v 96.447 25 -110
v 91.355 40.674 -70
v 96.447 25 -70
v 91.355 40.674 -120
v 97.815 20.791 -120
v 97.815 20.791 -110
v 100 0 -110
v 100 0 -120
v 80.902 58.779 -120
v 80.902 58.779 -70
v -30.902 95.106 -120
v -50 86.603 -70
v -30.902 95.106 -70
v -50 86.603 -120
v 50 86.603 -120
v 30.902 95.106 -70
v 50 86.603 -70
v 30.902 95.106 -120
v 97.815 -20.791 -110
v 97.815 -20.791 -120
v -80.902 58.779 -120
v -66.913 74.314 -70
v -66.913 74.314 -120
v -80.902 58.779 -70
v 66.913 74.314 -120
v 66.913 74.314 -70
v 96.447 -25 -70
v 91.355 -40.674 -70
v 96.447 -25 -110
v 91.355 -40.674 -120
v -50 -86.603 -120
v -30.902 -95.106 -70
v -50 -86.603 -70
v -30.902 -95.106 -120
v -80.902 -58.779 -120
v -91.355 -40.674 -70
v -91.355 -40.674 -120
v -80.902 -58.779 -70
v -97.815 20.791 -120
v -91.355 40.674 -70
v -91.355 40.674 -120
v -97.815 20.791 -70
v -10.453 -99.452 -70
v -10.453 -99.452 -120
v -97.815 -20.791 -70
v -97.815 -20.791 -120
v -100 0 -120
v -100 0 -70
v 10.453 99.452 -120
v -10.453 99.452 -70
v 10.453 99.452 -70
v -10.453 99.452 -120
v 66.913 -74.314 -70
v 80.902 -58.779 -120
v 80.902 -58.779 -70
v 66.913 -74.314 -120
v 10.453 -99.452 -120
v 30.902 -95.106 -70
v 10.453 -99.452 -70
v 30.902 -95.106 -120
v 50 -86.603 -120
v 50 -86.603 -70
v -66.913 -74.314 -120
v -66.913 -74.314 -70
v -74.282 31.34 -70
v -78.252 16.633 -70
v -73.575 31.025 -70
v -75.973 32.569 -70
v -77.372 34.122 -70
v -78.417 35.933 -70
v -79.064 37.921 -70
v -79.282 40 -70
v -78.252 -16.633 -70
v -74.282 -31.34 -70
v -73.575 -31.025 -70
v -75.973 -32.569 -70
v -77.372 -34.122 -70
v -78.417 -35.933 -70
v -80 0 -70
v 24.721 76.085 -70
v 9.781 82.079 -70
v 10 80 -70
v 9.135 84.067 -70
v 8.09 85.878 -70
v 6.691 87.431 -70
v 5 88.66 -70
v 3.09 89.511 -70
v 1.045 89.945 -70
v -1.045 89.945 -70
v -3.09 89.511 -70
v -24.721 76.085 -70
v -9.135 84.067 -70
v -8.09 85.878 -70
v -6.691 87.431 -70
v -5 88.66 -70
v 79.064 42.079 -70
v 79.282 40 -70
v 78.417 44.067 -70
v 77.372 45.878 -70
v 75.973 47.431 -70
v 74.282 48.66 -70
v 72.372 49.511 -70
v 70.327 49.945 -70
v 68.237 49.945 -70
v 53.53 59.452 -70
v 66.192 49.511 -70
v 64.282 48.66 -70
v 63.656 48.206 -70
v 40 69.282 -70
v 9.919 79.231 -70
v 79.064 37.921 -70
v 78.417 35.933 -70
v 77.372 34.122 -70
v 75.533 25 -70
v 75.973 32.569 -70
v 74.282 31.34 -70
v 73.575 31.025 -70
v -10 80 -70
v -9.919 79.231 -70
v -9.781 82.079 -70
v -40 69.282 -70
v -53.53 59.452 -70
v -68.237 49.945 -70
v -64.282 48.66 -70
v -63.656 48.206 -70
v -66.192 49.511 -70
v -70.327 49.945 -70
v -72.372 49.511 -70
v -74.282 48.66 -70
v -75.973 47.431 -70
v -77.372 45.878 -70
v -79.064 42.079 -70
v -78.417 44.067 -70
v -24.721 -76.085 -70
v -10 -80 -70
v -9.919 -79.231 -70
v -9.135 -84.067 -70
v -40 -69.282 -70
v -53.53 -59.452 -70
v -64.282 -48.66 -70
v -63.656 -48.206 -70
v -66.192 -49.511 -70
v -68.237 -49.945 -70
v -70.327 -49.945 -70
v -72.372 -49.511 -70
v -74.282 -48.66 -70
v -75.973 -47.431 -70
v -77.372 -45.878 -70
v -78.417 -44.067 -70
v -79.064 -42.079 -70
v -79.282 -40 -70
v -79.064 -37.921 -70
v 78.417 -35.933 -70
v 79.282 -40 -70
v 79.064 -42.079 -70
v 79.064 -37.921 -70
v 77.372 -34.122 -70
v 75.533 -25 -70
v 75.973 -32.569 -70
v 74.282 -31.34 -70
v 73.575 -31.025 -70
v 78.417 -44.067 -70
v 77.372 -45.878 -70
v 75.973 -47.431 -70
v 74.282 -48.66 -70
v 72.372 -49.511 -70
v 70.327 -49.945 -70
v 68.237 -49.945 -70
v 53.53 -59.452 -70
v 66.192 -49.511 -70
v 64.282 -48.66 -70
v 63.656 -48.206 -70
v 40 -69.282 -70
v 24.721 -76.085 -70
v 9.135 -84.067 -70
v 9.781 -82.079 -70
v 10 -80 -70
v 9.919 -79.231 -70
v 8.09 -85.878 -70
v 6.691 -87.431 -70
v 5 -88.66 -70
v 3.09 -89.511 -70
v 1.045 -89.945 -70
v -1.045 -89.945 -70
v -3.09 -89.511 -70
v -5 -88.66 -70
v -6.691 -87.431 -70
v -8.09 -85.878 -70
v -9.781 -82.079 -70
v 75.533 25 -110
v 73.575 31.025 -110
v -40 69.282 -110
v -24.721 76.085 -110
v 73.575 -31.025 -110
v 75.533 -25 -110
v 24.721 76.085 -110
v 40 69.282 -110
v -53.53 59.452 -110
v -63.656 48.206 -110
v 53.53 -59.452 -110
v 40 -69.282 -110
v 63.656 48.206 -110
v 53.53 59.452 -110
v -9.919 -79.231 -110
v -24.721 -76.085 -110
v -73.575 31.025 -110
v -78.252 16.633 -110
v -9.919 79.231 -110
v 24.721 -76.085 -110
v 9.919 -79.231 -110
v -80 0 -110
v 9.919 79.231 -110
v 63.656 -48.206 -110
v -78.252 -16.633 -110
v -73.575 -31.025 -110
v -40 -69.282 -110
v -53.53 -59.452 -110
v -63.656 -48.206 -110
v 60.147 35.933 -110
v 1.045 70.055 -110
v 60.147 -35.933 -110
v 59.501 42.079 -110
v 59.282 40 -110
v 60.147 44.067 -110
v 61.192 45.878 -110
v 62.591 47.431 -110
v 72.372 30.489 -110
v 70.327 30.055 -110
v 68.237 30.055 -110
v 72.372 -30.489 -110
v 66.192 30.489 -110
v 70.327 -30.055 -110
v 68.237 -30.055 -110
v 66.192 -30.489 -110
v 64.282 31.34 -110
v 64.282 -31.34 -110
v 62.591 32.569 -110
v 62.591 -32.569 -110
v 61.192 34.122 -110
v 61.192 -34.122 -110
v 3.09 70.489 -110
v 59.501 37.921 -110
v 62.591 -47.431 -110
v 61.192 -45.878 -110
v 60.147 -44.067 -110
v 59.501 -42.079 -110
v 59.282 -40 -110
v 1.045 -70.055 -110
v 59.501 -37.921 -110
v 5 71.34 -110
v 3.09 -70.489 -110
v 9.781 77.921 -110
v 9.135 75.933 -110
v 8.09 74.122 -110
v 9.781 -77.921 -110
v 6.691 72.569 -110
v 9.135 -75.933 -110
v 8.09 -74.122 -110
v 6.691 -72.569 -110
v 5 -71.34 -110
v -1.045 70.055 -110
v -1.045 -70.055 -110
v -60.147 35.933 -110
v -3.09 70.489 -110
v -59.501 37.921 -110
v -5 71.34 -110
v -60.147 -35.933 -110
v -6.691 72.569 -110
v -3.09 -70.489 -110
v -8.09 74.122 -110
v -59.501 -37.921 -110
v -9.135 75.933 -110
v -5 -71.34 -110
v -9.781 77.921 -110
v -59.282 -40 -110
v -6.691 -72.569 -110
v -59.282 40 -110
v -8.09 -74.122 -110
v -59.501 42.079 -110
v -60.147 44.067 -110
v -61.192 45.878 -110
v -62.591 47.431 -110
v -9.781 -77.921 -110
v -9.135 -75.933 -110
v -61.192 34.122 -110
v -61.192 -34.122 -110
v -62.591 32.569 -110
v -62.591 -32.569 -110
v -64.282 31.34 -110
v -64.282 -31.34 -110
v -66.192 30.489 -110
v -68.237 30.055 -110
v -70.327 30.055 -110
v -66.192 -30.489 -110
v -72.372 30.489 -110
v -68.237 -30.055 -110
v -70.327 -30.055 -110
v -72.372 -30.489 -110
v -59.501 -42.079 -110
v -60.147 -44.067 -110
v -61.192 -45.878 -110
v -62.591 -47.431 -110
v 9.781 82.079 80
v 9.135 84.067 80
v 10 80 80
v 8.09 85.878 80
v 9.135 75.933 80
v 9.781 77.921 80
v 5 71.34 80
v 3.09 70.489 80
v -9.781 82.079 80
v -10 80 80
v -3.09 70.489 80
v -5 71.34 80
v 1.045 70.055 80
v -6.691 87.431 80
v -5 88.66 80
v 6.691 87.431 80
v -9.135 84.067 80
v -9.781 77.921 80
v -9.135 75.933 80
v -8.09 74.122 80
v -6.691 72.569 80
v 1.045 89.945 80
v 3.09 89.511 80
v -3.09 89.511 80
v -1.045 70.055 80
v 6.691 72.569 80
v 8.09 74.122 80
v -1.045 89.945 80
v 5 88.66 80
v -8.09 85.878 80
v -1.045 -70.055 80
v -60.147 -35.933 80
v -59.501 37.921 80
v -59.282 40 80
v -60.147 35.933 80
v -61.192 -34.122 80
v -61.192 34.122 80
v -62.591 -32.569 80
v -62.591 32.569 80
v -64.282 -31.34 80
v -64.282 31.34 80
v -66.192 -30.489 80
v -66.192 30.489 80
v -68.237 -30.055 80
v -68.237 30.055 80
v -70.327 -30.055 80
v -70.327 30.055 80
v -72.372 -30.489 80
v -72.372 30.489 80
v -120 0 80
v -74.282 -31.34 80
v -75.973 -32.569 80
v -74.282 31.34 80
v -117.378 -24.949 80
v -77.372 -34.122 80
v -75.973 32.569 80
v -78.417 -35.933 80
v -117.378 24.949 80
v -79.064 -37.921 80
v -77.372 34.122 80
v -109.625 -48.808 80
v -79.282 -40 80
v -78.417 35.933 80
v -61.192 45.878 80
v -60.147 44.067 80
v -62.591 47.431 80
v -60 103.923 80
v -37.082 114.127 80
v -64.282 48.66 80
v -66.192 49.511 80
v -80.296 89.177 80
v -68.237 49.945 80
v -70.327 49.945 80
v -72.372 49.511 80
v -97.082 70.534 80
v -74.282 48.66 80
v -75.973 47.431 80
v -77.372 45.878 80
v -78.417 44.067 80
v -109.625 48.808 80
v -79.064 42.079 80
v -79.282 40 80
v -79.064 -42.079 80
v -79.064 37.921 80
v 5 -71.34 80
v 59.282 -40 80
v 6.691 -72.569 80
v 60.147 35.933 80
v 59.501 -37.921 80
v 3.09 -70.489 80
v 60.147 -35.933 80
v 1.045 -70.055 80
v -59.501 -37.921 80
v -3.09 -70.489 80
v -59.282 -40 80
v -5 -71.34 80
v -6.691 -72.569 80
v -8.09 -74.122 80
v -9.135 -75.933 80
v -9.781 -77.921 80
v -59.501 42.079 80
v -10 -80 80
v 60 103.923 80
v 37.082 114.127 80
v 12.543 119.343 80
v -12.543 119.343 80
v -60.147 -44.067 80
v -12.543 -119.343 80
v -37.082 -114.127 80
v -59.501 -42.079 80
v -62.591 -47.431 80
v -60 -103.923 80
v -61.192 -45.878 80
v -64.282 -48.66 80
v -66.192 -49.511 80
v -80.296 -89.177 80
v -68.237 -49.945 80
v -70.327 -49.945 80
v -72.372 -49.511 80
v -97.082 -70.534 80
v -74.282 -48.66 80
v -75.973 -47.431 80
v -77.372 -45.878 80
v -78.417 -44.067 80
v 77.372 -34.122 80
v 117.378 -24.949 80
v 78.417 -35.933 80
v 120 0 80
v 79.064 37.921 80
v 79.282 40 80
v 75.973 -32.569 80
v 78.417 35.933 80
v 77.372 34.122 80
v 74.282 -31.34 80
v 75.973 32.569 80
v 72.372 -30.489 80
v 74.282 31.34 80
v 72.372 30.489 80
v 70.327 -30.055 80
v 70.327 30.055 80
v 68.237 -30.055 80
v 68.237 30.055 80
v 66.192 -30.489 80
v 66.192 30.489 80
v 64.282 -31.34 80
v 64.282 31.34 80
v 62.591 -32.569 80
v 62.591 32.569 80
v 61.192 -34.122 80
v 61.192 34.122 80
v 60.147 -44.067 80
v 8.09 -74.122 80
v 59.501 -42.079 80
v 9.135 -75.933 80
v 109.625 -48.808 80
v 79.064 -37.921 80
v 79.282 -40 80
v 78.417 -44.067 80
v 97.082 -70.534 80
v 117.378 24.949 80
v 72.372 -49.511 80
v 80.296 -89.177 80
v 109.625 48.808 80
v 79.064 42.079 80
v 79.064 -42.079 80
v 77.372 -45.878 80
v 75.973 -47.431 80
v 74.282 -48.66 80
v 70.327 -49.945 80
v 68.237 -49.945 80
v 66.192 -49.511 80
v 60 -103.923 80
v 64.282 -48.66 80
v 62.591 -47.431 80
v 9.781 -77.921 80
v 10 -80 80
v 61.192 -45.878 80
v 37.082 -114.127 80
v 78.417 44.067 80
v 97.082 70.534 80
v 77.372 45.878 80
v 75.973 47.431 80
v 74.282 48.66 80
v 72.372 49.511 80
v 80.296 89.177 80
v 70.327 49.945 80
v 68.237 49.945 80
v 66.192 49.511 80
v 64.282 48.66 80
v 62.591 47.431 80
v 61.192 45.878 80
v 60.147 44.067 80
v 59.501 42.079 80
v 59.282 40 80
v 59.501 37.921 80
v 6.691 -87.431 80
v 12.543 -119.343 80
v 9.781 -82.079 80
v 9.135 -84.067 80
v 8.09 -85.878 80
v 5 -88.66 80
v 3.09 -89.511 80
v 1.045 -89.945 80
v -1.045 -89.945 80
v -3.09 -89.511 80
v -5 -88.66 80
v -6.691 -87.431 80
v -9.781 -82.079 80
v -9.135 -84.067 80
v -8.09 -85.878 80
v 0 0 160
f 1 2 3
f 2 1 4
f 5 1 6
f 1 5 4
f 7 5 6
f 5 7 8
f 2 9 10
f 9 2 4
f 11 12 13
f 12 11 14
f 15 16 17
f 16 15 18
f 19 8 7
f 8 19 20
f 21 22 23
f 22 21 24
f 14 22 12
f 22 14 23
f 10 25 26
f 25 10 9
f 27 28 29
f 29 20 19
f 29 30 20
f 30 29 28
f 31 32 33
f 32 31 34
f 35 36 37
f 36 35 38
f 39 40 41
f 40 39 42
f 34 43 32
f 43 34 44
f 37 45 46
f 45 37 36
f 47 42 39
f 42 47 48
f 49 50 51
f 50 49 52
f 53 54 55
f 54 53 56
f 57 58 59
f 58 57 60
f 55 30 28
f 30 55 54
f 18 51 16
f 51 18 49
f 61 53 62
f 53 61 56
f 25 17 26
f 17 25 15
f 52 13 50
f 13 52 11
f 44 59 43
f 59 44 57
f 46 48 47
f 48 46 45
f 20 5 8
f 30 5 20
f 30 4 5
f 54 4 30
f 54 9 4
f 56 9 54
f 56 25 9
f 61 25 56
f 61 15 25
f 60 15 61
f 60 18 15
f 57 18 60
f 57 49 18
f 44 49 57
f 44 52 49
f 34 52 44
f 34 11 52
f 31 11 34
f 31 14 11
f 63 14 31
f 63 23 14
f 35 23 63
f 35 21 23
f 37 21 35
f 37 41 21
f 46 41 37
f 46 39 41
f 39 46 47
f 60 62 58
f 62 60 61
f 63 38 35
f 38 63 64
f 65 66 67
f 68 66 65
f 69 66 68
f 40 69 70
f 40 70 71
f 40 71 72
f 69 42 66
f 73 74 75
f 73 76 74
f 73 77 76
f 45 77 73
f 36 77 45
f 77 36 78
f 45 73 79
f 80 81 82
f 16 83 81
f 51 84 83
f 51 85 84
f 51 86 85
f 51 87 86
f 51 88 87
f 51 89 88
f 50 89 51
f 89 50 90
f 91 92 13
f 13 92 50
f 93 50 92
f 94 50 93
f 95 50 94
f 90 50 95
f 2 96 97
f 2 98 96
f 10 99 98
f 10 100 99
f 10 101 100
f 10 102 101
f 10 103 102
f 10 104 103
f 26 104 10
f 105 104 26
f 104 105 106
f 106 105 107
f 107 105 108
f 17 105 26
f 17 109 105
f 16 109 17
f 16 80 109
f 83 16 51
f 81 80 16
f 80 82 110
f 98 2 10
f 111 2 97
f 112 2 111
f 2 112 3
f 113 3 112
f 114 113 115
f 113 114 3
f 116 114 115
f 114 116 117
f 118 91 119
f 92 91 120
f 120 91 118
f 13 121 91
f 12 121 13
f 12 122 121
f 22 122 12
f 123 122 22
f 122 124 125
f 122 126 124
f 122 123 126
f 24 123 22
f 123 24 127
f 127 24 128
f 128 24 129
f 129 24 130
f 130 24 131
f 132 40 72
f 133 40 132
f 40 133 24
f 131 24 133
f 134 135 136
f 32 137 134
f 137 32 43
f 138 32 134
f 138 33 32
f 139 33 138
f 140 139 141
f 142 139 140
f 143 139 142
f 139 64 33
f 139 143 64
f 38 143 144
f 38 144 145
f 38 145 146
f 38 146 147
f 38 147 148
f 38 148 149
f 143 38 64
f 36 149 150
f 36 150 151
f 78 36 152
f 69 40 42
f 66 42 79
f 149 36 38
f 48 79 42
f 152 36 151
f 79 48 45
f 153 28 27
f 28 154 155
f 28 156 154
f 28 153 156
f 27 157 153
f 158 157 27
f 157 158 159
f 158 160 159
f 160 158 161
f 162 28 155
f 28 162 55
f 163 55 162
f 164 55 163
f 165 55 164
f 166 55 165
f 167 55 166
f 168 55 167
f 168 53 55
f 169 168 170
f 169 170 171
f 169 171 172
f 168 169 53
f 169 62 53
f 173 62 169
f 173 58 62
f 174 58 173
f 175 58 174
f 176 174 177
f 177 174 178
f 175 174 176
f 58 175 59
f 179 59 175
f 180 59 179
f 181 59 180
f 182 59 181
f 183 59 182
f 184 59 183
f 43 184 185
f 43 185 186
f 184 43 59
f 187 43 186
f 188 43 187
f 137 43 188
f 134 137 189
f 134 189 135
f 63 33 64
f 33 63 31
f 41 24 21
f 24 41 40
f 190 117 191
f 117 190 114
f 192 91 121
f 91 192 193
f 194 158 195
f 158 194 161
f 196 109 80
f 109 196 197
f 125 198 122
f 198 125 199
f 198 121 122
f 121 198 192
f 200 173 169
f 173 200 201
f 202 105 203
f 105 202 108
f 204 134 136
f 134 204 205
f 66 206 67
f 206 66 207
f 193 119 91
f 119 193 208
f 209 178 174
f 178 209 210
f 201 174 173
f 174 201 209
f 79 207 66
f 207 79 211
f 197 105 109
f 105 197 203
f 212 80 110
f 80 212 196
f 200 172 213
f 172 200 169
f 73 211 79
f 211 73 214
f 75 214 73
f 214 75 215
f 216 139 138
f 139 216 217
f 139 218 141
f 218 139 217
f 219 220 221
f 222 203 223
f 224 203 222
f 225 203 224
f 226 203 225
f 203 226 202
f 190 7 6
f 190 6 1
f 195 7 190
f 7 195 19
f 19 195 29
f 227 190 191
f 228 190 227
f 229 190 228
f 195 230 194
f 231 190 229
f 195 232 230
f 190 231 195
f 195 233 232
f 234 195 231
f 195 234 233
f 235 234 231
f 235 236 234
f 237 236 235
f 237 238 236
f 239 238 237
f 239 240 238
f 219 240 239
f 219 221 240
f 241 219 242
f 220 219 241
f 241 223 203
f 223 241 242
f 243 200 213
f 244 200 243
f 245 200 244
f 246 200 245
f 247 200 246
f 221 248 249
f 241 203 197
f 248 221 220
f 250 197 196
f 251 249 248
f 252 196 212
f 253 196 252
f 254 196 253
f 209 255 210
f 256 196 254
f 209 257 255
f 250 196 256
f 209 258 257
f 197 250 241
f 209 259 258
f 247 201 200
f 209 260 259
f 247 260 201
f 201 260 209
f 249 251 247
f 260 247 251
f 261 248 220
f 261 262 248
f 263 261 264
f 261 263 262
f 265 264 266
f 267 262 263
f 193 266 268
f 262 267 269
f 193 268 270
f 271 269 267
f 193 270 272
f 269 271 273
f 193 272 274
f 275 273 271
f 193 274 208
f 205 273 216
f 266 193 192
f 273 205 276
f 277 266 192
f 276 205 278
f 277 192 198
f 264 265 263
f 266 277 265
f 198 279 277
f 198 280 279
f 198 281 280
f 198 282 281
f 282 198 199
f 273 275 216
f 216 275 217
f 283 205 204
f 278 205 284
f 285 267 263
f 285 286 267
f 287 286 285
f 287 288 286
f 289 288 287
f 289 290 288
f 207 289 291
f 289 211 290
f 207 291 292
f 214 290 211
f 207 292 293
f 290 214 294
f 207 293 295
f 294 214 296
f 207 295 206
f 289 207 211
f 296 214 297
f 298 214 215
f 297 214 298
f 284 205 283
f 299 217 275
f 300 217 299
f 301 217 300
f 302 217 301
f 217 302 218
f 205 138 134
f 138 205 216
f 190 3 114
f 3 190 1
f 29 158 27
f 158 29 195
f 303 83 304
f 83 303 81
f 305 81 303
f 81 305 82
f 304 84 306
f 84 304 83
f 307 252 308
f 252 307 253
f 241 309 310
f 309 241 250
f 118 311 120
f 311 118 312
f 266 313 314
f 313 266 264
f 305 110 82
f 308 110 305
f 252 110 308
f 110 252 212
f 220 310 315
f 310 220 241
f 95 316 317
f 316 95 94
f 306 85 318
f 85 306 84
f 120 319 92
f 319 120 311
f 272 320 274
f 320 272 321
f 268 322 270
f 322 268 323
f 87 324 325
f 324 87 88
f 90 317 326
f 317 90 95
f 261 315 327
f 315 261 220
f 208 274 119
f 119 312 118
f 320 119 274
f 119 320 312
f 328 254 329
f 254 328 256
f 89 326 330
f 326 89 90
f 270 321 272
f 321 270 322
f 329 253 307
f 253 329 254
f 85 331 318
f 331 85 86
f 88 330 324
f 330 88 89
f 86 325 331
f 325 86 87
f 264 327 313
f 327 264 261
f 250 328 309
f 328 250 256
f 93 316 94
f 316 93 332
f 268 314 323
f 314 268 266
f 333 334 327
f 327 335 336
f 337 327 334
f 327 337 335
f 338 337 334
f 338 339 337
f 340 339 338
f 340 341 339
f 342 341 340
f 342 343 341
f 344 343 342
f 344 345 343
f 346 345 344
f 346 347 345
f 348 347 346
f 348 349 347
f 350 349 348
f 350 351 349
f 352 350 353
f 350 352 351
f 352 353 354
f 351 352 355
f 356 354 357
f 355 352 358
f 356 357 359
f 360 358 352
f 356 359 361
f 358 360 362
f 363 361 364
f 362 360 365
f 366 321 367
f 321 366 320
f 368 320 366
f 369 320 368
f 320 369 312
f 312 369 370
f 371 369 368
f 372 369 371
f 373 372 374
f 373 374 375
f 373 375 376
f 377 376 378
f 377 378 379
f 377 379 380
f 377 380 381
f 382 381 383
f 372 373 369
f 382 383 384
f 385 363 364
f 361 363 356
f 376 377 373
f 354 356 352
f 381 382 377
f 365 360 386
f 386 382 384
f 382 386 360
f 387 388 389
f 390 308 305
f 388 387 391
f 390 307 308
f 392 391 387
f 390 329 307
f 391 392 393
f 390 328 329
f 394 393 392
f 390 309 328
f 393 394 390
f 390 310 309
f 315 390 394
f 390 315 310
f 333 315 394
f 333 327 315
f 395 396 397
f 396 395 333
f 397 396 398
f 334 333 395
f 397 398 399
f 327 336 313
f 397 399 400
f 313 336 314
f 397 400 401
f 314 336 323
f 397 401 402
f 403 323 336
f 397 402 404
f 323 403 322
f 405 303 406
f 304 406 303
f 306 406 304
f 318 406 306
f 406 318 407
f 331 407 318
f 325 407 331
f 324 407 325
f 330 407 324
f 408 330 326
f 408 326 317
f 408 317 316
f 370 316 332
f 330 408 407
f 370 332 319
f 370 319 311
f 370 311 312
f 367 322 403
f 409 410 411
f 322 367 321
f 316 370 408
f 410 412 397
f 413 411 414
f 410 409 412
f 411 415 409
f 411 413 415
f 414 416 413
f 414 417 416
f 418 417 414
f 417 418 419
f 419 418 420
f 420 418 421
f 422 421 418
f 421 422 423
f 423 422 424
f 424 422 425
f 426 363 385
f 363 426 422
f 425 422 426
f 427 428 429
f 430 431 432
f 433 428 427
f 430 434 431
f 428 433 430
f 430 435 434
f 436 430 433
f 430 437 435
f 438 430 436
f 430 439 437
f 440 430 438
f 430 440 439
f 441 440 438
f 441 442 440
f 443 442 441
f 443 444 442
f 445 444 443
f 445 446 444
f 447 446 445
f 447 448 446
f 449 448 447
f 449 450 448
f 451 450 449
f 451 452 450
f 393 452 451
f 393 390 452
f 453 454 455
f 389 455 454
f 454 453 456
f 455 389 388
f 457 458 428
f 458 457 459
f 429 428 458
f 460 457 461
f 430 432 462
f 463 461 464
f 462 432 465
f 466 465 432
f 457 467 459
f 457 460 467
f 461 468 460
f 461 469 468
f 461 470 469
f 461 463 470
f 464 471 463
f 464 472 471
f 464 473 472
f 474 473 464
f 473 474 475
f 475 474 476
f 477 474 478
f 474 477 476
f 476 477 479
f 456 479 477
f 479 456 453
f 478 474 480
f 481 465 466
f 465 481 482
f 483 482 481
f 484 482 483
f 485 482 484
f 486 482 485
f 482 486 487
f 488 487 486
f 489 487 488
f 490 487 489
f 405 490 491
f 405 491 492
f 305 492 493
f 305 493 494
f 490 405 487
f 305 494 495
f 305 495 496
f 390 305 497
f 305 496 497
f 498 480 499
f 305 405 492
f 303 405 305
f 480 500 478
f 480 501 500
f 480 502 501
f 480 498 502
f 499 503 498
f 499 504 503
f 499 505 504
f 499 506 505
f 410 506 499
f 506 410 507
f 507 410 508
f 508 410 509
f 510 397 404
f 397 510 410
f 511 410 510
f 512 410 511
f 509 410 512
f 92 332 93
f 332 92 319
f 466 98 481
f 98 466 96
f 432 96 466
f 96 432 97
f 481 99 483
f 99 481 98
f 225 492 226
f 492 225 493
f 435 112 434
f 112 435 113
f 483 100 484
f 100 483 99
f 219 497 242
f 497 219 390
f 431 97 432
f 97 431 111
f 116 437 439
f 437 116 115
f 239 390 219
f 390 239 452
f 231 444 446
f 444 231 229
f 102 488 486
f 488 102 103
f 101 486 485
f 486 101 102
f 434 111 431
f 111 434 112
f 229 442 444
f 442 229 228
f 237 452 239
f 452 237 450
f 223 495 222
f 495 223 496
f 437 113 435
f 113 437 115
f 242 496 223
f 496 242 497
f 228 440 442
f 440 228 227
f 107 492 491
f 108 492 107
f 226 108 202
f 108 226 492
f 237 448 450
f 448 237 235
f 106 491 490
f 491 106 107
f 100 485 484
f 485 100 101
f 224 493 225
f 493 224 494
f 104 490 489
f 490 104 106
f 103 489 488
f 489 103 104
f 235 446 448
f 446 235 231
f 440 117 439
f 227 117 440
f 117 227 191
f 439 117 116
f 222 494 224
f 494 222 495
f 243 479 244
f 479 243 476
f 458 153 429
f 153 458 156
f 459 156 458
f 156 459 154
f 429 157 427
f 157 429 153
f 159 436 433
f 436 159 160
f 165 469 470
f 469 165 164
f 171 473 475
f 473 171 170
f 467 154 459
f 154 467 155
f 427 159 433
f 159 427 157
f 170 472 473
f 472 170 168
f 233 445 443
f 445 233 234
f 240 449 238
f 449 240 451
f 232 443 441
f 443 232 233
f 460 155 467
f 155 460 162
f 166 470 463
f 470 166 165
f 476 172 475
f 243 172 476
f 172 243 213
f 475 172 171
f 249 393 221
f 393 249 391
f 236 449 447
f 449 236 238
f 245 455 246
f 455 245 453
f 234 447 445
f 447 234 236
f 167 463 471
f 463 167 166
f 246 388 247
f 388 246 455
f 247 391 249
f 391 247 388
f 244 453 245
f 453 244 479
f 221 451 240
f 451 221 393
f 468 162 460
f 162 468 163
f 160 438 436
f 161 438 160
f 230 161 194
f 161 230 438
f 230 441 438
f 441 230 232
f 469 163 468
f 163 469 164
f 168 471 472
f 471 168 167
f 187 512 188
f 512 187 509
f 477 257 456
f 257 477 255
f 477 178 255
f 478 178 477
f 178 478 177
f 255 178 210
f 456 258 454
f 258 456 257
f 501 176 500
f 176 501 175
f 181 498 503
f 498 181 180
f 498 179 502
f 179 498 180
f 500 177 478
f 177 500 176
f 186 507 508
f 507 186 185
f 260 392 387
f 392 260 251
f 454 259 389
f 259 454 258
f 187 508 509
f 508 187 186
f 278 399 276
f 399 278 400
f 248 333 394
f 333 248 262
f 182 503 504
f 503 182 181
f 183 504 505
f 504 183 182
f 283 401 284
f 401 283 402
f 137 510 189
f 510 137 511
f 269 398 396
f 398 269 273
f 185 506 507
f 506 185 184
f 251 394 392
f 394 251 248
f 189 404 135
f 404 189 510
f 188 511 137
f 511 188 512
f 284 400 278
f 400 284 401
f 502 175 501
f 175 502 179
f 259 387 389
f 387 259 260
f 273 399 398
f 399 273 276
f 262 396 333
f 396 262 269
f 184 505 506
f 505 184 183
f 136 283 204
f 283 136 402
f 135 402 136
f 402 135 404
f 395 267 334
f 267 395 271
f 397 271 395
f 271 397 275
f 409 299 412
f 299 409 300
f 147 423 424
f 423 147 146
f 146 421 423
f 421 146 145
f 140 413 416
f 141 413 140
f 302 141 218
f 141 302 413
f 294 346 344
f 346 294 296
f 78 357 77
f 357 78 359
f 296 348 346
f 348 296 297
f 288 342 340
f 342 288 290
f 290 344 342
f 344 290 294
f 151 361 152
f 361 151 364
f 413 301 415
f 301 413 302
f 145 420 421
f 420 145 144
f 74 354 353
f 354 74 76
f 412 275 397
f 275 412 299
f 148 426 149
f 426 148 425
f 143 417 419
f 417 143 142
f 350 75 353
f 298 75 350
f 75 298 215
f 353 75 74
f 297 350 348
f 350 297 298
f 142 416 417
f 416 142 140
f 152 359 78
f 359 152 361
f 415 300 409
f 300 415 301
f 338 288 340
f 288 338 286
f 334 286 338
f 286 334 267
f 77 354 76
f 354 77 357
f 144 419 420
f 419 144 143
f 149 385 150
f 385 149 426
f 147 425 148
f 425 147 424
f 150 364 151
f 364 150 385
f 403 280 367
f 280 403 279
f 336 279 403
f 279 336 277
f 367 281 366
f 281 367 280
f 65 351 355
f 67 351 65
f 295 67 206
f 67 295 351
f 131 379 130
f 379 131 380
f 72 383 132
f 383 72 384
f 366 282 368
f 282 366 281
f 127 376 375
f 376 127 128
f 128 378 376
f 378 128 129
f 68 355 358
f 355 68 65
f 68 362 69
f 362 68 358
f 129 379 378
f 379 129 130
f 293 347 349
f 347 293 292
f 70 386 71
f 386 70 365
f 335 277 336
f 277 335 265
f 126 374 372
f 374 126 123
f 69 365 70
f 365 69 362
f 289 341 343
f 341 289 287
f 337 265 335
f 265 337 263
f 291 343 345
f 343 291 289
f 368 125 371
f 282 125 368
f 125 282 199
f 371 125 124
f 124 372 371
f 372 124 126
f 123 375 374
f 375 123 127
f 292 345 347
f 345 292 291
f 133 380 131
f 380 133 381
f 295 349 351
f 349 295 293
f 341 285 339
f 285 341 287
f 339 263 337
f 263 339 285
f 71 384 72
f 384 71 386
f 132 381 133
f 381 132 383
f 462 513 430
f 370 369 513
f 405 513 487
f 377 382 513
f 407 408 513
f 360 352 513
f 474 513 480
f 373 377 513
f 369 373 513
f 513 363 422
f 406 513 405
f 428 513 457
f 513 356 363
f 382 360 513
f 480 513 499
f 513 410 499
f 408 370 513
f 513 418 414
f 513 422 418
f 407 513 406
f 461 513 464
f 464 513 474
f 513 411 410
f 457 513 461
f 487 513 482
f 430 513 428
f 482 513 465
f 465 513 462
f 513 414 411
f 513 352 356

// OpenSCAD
module house()
{
	translate([0, 0, -120]) {
		difference() {
			cylinder(h = 50, r = 100);
			translate([0, 0, 10]) cylinder(h = 50, r = 80);
			translate([100, 0, 35]) cube(50, center = true);
		}
		for (i = [0:5]) {
			echo(360*i/6, sin(360*i/6)*80, cos(360*i/6)*80);
			translate([sin(360*i/6)*80, cos(360*i/6)*80, 0 ])
				cylinder(h = 200, r=10);
		}
		translate([0, 0, 200])
			cylinder(h = 80, r1 = 120, r2 = 0);
	}
}

house();
